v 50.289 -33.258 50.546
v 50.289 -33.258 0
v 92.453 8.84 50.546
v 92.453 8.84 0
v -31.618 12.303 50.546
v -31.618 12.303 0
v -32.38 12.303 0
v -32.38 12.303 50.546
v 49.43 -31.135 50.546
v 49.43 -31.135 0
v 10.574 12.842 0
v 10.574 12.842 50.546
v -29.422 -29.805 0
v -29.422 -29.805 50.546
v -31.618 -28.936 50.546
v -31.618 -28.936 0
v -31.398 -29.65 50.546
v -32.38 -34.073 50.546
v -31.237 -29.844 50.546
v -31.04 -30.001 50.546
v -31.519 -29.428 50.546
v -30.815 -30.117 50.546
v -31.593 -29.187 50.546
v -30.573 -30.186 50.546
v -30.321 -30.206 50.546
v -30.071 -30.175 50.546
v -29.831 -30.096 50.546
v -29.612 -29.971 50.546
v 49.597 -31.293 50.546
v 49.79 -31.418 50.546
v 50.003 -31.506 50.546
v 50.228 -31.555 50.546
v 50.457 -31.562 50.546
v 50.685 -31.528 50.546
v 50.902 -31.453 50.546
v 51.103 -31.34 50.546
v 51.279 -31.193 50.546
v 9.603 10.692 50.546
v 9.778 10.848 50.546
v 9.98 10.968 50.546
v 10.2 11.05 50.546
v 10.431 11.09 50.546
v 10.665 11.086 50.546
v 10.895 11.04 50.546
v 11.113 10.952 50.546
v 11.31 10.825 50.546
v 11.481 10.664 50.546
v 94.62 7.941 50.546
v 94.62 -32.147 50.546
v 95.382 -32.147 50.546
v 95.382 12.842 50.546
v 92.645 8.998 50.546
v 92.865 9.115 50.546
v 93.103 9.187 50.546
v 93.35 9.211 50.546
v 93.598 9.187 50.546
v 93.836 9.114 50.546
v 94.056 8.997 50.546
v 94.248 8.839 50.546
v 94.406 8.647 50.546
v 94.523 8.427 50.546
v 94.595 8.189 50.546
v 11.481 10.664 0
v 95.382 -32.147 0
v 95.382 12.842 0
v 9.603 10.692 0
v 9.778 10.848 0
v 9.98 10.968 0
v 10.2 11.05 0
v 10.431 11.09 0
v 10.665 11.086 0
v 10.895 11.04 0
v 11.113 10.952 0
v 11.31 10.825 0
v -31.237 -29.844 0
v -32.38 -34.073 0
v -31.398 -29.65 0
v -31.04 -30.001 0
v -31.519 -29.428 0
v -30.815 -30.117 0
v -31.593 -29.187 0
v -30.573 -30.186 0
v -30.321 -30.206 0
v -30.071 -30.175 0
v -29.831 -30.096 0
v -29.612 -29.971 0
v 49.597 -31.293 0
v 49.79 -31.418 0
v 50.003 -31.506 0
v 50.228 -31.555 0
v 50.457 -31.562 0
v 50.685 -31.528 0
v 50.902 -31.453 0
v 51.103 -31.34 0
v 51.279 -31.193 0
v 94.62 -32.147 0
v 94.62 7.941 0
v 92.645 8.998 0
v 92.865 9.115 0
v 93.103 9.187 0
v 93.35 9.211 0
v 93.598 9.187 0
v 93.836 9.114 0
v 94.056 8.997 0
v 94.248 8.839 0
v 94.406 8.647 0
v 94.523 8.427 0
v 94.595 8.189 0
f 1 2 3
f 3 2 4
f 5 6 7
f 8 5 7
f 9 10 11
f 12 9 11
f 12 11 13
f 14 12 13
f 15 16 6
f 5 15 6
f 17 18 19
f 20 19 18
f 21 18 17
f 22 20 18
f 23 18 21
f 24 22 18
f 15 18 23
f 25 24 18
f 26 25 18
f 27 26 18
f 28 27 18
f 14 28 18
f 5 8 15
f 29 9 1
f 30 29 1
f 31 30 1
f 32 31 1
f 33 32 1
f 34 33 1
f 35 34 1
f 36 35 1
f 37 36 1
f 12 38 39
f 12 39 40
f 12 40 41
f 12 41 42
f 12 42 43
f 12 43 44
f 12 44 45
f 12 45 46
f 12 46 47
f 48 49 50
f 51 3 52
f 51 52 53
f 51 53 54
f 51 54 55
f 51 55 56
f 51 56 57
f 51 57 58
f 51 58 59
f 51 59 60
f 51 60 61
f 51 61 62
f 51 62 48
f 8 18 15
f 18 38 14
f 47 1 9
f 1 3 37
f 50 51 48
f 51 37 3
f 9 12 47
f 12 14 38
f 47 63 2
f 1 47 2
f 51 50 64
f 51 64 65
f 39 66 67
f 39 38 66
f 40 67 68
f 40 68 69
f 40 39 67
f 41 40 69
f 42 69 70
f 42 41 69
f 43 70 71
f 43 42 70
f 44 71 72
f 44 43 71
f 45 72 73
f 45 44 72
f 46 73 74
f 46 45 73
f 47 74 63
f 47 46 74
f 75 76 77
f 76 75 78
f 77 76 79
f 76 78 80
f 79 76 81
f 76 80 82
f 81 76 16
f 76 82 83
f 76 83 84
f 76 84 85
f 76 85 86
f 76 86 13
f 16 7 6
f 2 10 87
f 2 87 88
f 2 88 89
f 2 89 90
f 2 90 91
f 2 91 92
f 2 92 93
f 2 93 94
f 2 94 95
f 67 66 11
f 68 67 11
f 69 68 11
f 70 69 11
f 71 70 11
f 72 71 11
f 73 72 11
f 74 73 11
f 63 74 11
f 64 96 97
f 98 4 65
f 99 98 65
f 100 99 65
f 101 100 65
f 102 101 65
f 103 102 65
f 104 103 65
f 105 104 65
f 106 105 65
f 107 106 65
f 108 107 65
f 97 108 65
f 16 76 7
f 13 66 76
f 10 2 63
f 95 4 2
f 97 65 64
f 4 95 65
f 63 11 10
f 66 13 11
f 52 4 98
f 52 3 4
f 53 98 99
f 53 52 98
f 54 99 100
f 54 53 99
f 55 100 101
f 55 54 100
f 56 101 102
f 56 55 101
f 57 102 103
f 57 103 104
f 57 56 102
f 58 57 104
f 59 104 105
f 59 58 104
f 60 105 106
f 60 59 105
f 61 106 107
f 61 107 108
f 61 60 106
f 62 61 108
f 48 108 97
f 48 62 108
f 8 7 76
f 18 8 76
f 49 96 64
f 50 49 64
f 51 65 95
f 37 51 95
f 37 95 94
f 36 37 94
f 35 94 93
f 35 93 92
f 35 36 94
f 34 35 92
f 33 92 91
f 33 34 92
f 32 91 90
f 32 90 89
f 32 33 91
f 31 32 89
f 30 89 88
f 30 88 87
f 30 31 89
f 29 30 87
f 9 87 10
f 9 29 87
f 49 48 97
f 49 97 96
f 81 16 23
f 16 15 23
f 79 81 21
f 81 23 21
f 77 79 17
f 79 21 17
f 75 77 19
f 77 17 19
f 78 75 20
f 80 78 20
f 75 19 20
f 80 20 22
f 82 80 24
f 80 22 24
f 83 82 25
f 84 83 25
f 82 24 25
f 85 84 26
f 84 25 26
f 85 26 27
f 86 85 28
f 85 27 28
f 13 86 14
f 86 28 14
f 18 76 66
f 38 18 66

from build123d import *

# Parameters (mm, degrees)
F1_DEPTH = 50.546
F2_R     = 1.27


with BuildPart() as f1:
    # F0 (on Top) → F1 (new body)
    with BuildSketch(Plane.XY):
        Polygon((-31.618166, -32.146781), (-31.618166, 12.303219), (-32.380166, 12.303219), (-32.380166, -34.073195), (10.55717, 11.709783), (50.289296, -33.25828), (94.619834, 11.003976), (94.619834, -32.146781), (95.381834, -32.146781), (95.381834, 12.841604), (50.324047, -32.146781), (10.573965, 12.841604), align=None)
    extrude(amount=F1_DEPTH)

    # F2
    f2_edges = [f1.edges().sort_by_distance(p)[0] for p in [
        (10.55717, 11.709783, 25.273),
        (-31.618166, -32.146781, 25.273),
        (50.324047, -32.146781, 25.273),
        (94.619834, 11.003976, 25.273),
    ]]
    fillet(f2_edges, radius=F2_R)


solid = f1.part
